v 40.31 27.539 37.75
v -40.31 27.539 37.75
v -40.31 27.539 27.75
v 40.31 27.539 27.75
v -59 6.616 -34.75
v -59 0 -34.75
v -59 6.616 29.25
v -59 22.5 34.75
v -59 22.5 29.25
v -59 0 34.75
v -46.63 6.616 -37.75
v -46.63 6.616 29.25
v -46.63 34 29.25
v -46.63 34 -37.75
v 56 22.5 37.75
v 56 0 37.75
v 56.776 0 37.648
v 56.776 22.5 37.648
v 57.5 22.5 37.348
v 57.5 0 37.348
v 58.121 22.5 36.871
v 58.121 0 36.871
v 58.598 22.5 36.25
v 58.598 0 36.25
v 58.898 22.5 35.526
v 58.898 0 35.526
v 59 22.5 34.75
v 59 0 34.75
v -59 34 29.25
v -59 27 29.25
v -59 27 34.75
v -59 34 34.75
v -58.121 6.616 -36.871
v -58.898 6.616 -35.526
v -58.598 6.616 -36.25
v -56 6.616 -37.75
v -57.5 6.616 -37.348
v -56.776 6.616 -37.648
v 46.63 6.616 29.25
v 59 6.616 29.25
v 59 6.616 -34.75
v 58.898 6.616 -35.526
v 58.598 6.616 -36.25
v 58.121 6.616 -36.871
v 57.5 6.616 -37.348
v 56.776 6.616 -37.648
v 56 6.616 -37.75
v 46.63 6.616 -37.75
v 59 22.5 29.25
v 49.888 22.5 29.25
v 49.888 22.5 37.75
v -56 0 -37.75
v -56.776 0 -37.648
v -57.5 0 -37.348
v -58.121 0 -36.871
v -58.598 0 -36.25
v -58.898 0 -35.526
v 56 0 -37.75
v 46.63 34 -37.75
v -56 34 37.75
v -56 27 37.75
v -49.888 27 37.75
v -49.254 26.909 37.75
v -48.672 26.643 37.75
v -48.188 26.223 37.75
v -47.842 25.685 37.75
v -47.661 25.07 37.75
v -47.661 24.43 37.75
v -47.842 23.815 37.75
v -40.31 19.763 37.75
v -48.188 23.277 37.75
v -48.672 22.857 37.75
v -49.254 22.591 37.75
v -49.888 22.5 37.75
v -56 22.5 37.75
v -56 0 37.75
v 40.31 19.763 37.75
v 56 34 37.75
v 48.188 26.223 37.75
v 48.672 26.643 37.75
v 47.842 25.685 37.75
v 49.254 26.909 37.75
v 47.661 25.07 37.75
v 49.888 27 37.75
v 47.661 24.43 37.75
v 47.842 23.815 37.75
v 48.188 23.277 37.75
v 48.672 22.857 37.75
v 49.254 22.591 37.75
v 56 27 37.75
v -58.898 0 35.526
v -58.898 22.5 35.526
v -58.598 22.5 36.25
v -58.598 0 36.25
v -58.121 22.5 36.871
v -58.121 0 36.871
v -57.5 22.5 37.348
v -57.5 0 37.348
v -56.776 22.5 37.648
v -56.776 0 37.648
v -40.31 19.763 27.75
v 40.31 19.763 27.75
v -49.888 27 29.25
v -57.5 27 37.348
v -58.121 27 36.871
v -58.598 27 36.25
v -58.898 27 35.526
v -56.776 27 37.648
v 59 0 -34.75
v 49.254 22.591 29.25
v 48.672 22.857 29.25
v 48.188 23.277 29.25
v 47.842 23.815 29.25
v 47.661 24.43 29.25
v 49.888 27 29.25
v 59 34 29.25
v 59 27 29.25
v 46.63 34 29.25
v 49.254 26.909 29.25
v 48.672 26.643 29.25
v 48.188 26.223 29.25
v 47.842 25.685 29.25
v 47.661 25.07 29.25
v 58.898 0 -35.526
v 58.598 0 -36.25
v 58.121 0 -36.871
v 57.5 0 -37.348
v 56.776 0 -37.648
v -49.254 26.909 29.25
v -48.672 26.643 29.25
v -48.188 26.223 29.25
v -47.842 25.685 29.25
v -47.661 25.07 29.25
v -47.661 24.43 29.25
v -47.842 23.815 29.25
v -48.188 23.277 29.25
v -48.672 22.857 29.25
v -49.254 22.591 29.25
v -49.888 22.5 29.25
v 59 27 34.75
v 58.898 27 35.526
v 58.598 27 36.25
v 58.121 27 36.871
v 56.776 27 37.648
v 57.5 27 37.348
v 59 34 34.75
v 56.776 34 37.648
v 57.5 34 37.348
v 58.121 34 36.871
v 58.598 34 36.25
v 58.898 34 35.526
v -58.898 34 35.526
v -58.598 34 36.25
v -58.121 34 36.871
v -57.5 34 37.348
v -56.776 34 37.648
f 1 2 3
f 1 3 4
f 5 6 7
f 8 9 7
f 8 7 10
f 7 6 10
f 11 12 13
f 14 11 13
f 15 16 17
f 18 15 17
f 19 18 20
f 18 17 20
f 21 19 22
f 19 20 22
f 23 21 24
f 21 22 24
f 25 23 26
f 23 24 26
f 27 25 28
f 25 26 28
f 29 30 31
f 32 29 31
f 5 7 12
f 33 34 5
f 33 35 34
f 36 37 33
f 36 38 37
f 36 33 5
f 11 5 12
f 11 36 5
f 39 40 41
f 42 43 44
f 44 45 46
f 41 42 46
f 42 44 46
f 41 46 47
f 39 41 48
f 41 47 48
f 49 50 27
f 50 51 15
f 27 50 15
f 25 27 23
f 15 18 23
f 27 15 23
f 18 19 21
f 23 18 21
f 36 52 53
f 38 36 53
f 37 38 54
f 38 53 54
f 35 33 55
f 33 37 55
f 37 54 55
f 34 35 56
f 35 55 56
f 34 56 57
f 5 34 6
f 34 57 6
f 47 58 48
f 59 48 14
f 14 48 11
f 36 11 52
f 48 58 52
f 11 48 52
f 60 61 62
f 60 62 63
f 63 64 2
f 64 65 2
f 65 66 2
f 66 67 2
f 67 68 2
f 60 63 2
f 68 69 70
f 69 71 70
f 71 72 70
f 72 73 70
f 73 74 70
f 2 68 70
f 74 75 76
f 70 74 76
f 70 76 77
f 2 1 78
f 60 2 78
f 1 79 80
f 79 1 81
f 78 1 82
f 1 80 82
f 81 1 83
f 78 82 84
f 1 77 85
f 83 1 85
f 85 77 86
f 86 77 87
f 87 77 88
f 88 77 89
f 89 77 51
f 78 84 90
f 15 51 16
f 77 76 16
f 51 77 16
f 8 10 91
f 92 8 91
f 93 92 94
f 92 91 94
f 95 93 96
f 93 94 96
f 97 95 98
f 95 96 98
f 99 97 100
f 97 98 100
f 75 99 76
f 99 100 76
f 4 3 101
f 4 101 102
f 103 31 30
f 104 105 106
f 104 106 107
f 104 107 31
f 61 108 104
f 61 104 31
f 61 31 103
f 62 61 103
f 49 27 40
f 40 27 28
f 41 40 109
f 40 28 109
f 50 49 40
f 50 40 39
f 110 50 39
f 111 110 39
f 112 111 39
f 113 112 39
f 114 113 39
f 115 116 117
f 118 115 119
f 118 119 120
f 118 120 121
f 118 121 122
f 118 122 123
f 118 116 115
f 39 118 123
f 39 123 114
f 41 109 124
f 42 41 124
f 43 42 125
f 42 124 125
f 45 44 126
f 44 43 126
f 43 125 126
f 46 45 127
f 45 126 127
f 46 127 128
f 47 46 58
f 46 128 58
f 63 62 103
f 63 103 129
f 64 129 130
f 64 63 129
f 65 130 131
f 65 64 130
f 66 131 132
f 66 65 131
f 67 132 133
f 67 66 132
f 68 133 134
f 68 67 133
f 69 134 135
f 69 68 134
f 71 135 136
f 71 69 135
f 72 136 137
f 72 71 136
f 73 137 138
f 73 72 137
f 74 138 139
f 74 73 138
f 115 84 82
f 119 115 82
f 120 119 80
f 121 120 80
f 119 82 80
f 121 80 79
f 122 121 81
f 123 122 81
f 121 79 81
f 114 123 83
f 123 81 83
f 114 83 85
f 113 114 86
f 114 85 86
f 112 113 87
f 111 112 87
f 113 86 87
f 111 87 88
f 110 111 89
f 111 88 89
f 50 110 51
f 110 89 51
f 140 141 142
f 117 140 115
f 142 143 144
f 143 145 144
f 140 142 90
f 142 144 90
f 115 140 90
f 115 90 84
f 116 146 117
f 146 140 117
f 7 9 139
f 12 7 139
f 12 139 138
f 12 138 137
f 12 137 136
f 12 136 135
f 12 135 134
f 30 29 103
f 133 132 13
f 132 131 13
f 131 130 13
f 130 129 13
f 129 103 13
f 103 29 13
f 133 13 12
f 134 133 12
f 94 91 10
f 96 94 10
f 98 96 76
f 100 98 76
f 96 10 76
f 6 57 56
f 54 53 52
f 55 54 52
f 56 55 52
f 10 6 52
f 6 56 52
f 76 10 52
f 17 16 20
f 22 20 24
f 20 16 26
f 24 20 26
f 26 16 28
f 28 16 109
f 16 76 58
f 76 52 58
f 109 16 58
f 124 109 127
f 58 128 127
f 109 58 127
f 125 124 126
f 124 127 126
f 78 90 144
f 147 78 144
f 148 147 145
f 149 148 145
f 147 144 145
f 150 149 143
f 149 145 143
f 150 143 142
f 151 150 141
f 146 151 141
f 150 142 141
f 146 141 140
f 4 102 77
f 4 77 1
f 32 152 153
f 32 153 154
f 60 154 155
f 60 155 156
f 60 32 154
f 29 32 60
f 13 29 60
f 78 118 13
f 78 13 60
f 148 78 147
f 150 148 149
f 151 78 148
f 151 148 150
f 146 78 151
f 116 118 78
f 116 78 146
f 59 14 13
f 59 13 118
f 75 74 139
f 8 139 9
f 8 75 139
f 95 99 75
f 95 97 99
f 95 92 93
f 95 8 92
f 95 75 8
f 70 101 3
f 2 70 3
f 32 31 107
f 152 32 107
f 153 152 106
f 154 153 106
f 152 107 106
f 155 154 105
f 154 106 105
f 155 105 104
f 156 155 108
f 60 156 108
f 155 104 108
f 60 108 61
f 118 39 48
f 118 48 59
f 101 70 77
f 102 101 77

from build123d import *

# Parameters (mm, degrees)
BOSS_EXTRUDE1_DEPTH = 34
CUT_EXTRUDE1_DEPTH  = 34
SKETCH3_W           = 19.452595801
SKETCH3_H           = 34.121613058
CUT_EXTRUDE2_DEPTH  = 67
SKETCH4_W           = 80.61958461
SKETCH4_H           = 7.775745443
CUT_EXTRUDE3_DEPTH  = 10


with BuildPart() as part:
    # Sketch1 → Boss-Extrude1 (new body)
    with BuildSketch(Plane(origin=(0, 0, 0), x_dir=(1, 0, 0), z_dir=(0, 1, 0))):
        with BuildLine():
            Line((-56, -37.75), (56, -37.75))
            ThreePointArc((56, -37.75), (58.121320344, -36.871320344), (59, -34.75))
            Line((59, -34.75), (59, 34.75))
            ThreePointArc((59, 34.75), (58.121320344, 36.871320344), (56, 37.75))
            Line((56, 37.75), (-56, 37.75))
            ThreePointArc((-56, 37.75), (-58.121320344, 36.871320344), (-59, 34.75))
            Line((-59, 34.75), (-59, -34.75))
            ThreePointArc((-59, -34.75), (-58.121320344, -36.871320344), (-56, -37.75))
        make_face()
    extrude(amount=BOSS_EXTRUDE1_DEPTH)

    # Sketch2 → Cut-Extrude1 (cut)
    with BuildSketch(Plane.XY.offset(37.75)):
        with BuildLine():
            Line((-72.082720781, 27), (-49.888346505, 27))
            ThreePointArc((-49.888346505, 27), (-47.638346505, 24.75), (-49.888346505, 22.5))
            Line((-49.888346505, 22.5), (-72.082720781, 22.5))
            ThreePointArc((-72.082720781, 22.5), (-74.332720781, 24.75), (-72.082720781, 27))
        make_face()
    cut_extrude1 = extrude(amount=-CUT_EXTRUDE1_DEPTH, mode=Mode.SUBTRACT)

    # Mirror1: Cut-Extrude1 across plane
    add(cut_extrude1.mirror(Plane(origin=(0, 0, 0), x_dir=(0, 0, 1), z_dir=(1, 0, 0))), mode=Mode.SUBTRACT)

    # Sketch3 → Cut-Extrude2 (cut)
    with BuildSketch(Plane(origin=(0, 0, -37.75), x_dir=(-1, 0, 0), z_dir=(0, 0, -1))):
        with Locations((-56.356218478, 23.676559333)):
            Rectangle(SKETCH3_W, SKETCH3_H)
    cut_extrude2 = extrude(amount=-CUT_EXTRUDE2_DEPTH, mode=Mode.SUBTRACT)

    # Mirror2: Cut-Extrude2 across plane
    add(cut_extrude2.mirror(Plane(origin=(0, 0, 0), x_dir=(0, 0, 1), z_dir=(1, 0, 0))), mode=Mode.SUBTRACT)

    # Sketch4 → Cut-Extrude3 (cut)
    with BuildSketch(Plane.XY.offset(37.75)):
        with Locations((0, 23.651152712)):
            Rectangle(SKETCH4_W, SKETCH4_H)
    extrude(amount=-CUT_EXTRUDE3_DEPTH, mode=Mode.SUBTRACT)


solid = part.part
